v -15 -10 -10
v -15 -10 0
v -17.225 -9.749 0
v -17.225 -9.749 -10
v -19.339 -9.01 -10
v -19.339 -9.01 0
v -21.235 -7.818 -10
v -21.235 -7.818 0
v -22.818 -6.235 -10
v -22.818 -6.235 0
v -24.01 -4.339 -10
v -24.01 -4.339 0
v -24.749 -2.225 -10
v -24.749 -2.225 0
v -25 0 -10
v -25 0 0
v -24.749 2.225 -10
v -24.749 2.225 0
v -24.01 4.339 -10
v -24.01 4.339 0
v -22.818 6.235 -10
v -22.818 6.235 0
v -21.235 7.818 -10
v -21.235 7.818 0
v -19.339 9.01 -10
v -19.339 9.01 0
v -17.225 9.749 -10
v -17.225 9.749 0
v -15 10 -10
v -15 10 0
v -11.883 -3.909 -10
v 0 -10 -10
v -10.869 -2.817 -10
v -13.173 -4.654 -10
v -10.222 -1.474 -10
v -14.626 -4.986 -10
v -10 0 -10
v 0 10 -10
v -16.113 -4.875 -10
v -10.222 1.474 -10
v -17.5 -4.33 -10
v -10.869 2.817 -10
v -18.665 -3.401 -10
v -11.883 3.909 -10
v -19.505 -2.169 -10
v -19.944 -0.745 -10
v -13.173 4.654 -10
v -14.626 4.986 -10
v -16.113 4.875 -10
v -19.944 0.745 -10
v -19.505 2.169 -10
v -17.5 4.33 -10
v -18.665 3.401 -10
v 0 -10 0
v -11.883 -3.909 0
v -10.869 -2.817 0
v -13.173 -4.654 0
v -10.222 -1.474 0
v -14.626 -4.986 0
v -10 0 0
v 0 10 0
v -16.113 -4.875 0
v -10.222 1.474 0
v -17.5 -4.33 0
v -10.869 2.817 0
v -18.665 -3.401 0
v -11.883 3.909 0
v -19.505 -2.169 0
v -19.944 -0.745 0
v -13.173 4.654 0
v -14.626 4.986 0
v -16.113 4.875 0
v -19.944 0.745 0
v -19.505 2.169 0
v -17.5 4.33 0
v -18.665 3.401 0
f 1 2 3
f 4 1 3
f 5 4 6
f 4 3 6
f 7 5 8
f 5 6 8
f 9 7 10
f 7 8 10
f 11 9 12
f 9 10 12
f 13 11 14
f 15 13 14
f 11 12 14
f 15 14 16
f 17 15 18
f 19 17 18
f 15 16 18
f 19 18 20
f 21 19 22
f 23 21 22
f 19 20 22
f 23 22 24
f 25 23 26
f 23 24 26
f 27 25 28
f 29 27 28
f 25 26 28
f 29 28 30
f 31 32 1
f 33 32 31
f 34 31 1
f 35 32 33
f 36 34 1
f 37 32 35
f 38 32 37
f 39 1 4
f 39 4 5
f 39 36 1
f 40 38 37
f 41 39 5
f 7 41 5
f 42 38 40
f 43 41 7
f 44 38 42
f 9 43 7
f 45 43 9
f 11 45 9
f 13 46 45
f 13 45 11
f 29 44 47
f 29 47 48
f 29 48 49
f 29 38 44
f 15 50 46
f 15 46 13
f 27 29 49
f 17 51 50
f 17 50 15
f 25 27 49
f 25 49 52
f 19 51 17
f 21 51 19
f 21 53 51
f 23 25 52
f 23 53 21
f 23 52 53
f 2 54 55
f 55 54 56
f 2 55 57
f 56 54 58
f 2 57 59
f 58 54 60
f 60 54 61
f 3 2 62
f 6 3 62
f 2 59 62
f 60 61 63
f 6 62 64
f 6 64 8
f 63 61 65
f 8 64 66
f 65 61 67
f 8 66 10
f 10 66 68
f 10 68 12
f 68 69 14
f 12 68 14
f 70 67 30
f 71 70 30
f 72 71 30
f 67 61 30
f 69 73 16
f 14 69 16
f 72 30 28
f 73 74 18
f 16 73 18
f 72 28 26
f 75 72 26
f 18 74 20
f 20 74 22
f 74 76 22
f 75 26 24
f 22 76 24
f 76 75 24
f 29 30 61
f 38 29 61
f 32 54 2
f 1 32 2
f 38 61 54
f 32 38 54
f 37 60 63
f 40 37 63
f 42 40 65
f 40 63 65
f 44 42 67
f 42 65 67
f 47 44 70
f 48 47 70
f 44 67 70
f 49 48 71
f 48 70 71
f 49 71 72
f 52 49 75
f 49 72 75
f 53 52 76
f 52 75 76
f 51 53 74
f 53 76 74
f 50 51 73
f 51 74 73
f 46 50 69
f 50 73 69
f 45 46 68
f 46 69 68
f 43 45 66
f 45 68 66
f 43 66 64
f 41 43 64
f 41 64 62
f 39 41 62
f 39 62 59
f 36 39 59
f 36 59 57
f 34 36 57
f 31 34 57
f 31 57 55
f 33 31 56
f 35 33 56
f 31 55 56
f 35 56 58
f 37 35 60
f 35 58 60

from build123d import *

# Parameters (mm, degrees)
SKETCH2_R           = 5
BOSS_EXTRUDE1_DEPTH = 10


with BuildPart() as part:
    # Sketch2 → Boss-Extrude1 (new body)
    with BuildSketch(Plane.XY):
        with BuildLine():
            Line((0, 10), (0, -10))
            Line((0, -10), (-15, -10))
            ThreePointArc((-15, -10), (-25, 0), (-15, 10))
            Line((-15, 10), (0, 10))
        make_face()
        with Locations((-15, 0)):
            Circle(SKETCH2_R, mode=Mode.SUBTRACT)
    extrude(amount=-BOSS_EXTRUDE1_DEPTH)


solid = part.part
